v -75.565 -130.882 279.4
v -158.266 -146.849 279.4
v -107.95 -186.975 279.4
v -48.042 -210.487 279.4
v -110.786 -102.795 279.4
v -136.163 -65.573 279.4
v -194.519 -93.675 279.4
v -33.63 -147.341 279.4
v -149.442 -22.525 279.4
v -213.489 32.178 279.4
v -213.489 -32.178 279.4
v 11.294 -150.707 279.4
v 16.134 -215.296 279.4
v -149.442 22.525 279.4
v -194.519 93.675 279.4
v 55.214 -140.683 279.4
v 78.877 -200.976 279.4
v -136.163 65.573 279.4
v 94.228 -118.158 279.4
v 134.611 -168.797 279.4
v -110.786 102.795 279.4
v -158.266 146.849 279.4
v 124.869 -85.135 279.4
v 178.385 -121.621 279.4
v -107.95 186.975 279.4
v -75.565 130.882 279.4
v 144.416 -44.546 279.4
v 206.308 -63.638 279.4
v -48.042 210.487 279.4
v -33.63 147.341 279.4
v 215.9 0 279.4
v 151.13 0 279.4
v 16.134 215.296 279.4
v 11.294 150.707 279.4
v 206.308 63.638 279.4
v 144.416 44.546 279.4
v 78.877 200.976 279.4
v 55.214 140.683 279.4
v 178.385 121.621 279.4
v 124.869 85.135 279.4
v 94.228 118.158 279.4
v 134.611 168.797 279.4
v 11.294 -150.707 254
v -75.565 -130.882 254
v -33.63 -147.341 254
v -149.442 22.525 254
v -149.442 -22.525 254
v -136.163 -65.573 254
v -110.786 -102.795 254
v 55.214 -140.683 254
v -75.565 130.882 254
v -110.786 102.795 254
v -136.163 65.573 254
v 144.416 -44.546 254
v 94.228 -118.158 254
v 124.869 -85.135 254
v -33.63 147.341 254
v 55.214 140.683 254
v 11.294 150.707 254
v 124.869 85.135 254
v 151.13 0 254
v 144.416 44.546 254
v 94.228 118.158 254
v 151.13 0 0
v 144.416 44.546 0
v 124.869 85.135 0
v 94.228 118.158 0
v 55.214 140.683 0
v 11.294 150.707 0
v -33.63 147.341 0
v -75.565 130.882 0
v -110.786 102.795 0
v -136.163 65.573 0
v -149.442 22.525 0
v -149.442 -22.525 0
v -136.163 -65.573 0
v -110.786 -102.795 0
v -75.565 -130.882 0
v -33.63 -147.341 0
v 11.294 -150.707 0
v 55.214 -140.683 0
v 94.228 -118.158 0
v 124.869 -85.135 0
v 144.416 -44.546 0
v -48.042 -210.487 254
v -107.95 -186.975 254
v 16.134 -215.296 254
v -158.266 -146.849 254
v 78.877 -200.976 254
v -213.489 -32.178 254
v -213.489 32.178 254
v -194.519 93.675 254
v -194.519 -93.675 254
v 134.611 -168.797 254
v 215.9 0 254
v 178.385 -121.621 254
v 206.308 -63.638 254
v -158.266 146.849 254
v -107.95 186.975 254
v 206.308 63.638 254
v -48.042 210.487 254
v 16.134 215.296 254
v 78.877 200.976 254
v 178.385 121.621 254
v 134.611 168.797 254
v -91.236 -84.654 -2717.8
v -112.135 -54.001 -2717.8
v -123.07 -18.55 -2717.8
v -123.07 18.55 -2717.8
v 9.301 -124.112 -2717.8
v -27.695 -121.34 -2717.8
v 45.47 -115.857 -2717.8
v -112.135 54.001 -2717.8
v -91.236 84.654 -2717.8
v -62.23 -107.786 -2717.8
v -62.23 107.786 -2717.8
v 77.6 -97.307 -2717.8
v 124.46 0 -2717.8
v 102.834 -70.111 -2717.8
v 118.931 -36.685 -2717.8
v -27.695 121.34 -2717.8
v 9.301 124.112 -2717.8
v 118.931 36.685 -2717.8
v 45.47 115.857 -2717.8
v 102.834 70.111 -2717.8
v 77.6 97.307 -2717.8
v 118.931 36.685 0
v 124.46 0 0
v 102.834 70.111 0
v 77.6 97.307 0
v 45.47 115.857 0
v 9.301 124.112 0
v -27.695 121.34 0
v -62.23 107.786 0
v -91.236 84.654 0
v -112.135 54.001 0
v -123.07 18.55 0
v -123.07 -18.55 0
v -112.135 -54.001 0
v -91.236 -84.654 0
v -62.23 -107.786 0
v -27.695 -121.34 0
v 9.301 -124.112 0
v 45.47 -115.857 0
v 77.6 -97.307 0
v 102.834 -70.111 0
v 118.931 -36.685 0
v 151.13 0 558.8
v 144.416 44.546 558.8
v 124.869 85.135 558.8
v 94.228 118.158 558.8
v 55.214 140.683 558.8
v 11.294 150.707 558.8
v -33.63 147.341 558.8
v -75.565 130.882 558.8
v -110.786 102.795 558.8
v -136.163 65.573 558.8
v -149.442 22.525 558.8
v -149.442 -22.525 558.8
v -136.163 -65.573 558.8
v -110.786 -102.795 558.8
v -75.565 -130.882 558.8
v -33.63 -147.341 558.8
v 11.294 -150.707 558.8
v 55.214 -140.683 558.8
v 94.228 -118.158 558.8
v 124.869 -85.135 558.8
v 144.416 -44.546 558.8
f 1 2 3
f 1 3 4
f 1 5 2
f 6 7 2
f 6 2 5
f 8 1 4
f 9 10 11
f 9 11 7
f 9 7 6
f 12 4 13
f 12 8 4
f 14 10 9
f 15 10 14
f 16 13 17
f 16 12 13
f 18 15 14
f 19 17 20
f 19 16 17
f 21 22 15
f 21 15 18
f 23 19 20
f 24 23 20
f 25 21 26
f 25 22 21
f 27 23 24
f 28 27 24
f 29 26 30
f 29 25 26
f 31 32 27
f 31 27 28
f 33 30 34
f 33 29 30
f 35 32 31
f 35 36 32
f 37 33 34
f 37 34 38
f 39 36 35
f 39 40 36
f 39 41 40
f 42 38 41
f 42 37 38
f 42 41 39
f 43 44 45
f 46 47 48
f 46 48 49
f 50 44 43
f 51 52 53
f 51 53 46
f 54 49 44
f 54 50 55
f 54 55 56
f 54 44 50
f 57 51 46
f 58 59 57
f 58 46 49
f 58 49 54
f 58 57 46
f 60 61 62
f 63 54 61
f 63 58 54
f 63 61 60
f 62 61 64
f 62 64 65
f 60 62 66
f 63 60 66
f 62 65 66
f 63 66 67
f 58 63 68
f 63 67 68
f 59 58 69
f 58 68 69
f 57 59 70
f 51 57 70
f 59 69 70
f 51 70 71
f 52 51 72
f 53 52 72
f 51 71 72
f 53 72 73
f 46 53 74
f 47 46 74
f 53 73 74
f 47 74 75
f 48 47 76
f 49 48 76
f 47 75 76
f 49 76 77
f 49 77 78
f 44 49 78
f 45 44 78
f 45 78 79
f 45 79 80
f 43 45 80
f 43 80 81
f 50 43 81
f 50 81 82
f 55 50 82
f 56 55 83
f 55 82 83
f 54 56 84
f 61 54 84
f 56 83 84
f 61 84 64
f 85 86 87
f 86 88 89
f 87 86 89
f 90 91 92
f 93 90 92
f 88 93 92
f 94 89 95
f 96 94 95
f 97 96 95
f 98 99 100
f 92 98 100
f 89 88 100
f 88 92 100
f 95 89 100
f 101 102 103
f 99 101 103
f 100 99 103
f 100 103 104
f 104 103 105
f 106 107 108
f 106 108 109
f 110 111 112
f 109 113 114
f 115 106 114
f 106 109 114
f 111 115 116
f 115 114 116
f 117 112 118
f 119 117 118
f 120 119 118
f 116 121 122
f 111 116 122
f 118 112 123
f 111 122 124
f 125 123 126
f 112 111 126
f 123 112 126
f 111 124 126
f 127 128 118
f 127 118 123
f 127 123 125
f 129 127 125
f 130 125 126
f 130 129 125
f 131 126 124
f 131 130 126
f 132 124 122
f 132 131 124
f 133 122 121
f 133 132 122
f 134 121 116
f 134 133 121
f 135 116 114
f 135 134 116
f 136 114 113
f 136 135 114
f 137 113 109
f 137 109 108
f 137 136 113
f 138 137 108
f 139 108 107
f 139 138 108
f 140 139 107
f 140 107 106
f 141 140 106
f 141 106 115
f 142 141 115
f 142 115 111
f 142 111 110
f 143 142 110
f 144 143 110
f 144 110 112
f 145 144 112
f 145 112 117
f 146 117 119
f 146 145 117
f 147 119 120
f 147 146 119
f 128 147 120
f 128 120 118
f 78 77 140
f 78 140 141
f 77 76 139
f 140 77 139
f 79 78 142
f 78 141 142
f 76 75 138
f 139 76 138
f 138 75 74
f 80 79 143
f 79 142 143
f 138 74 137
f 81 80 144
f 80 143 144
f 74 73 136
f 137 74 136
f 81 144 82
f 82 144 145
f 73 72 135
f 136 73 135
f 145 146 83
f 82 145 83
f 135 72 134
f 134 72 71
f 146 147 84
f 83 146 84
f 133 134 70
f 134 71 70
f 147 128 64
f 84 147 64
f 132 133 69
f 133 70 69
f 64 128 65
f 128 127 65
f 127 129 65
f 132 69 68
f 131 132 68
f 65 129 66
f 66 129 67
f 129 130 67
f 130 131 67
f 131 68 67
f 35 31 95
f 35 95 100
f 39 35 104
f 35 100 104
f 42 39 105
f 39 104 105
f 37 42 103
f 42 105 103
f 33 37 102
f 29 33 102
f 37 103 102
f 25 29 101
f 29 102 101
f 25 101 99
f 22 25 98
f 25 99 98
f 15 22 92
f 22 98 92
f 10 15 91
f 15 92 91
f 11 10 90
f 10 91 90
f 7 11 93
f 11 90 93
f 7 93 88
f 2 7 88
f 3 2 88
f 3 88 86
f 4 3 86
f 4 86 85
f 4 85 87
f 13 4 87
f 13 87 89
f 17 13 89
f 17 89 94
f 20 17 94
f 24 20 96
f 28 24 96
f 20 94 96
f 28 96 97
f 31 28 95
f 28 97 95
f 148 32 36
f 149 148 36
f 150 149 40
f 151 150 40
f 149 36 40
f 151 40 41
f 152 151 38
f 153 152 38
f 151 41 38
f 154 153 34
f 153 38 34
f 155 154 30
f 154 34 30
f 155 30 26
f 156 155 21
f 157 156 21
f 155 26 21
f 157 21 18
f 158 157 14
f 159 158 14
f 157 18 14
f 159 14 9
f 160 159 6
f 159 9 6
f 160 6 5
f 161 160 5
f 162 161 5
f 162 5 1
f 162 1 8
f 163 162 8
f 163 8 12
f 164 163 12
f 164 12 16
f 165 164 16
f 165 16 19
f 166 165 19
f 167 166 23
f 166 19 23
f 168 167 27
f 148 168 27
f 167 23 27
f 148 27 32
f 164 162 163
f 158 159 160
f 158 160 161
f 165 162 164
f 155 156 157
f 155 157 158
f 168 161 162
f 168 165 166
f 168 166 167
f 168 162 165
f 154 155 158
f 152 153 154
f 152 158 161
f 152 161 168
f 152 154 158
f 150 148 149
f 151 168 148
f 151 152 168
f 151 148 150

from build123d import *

# Parameters (mm, degrees)
F0_R     = 124.46
F1_DEPTH = 2717.8
F2_R     = 151.13
F3_DEPTH = 254
F4_R     = 215.9
F4_R_2   = 151.13
F5_DEPTH = 25.4
F6_R     = 151.13
F7_DEPTH = 279.4


with BuildPart() as f1:
    # F0 (on Top) → F1 (new body)
    with BuildSketch(Plane.XY):
        Circle(F0_R)
    extrude(amount=-F1_DEPTH)

    # F2 (on Top) → F3 (join)
    with BuildSketch(Plane.XY):
        Circle(F2_R)
    extrude(amount=F3_DEPTH)


with BuildPart() as f5:
    # F4 (on face) → F5 (new body)
    with BuildSketch(Plane.XY.offset(254)):
        Circle(F4_R)
        Circle(F4_R_2, mode=Mode.SUBTRACT)
        Circle(F4_R_2)
    extrude(amount=F5_DEPTH)

    # F6 (on face) → F7 (join)
    with BuildSketch(Plane.XY.offset(279.4)):
        Circle(F6_R)
    extrude(amount=F7_DEPTH)


solid = Compound([f1.part, f5.part])
